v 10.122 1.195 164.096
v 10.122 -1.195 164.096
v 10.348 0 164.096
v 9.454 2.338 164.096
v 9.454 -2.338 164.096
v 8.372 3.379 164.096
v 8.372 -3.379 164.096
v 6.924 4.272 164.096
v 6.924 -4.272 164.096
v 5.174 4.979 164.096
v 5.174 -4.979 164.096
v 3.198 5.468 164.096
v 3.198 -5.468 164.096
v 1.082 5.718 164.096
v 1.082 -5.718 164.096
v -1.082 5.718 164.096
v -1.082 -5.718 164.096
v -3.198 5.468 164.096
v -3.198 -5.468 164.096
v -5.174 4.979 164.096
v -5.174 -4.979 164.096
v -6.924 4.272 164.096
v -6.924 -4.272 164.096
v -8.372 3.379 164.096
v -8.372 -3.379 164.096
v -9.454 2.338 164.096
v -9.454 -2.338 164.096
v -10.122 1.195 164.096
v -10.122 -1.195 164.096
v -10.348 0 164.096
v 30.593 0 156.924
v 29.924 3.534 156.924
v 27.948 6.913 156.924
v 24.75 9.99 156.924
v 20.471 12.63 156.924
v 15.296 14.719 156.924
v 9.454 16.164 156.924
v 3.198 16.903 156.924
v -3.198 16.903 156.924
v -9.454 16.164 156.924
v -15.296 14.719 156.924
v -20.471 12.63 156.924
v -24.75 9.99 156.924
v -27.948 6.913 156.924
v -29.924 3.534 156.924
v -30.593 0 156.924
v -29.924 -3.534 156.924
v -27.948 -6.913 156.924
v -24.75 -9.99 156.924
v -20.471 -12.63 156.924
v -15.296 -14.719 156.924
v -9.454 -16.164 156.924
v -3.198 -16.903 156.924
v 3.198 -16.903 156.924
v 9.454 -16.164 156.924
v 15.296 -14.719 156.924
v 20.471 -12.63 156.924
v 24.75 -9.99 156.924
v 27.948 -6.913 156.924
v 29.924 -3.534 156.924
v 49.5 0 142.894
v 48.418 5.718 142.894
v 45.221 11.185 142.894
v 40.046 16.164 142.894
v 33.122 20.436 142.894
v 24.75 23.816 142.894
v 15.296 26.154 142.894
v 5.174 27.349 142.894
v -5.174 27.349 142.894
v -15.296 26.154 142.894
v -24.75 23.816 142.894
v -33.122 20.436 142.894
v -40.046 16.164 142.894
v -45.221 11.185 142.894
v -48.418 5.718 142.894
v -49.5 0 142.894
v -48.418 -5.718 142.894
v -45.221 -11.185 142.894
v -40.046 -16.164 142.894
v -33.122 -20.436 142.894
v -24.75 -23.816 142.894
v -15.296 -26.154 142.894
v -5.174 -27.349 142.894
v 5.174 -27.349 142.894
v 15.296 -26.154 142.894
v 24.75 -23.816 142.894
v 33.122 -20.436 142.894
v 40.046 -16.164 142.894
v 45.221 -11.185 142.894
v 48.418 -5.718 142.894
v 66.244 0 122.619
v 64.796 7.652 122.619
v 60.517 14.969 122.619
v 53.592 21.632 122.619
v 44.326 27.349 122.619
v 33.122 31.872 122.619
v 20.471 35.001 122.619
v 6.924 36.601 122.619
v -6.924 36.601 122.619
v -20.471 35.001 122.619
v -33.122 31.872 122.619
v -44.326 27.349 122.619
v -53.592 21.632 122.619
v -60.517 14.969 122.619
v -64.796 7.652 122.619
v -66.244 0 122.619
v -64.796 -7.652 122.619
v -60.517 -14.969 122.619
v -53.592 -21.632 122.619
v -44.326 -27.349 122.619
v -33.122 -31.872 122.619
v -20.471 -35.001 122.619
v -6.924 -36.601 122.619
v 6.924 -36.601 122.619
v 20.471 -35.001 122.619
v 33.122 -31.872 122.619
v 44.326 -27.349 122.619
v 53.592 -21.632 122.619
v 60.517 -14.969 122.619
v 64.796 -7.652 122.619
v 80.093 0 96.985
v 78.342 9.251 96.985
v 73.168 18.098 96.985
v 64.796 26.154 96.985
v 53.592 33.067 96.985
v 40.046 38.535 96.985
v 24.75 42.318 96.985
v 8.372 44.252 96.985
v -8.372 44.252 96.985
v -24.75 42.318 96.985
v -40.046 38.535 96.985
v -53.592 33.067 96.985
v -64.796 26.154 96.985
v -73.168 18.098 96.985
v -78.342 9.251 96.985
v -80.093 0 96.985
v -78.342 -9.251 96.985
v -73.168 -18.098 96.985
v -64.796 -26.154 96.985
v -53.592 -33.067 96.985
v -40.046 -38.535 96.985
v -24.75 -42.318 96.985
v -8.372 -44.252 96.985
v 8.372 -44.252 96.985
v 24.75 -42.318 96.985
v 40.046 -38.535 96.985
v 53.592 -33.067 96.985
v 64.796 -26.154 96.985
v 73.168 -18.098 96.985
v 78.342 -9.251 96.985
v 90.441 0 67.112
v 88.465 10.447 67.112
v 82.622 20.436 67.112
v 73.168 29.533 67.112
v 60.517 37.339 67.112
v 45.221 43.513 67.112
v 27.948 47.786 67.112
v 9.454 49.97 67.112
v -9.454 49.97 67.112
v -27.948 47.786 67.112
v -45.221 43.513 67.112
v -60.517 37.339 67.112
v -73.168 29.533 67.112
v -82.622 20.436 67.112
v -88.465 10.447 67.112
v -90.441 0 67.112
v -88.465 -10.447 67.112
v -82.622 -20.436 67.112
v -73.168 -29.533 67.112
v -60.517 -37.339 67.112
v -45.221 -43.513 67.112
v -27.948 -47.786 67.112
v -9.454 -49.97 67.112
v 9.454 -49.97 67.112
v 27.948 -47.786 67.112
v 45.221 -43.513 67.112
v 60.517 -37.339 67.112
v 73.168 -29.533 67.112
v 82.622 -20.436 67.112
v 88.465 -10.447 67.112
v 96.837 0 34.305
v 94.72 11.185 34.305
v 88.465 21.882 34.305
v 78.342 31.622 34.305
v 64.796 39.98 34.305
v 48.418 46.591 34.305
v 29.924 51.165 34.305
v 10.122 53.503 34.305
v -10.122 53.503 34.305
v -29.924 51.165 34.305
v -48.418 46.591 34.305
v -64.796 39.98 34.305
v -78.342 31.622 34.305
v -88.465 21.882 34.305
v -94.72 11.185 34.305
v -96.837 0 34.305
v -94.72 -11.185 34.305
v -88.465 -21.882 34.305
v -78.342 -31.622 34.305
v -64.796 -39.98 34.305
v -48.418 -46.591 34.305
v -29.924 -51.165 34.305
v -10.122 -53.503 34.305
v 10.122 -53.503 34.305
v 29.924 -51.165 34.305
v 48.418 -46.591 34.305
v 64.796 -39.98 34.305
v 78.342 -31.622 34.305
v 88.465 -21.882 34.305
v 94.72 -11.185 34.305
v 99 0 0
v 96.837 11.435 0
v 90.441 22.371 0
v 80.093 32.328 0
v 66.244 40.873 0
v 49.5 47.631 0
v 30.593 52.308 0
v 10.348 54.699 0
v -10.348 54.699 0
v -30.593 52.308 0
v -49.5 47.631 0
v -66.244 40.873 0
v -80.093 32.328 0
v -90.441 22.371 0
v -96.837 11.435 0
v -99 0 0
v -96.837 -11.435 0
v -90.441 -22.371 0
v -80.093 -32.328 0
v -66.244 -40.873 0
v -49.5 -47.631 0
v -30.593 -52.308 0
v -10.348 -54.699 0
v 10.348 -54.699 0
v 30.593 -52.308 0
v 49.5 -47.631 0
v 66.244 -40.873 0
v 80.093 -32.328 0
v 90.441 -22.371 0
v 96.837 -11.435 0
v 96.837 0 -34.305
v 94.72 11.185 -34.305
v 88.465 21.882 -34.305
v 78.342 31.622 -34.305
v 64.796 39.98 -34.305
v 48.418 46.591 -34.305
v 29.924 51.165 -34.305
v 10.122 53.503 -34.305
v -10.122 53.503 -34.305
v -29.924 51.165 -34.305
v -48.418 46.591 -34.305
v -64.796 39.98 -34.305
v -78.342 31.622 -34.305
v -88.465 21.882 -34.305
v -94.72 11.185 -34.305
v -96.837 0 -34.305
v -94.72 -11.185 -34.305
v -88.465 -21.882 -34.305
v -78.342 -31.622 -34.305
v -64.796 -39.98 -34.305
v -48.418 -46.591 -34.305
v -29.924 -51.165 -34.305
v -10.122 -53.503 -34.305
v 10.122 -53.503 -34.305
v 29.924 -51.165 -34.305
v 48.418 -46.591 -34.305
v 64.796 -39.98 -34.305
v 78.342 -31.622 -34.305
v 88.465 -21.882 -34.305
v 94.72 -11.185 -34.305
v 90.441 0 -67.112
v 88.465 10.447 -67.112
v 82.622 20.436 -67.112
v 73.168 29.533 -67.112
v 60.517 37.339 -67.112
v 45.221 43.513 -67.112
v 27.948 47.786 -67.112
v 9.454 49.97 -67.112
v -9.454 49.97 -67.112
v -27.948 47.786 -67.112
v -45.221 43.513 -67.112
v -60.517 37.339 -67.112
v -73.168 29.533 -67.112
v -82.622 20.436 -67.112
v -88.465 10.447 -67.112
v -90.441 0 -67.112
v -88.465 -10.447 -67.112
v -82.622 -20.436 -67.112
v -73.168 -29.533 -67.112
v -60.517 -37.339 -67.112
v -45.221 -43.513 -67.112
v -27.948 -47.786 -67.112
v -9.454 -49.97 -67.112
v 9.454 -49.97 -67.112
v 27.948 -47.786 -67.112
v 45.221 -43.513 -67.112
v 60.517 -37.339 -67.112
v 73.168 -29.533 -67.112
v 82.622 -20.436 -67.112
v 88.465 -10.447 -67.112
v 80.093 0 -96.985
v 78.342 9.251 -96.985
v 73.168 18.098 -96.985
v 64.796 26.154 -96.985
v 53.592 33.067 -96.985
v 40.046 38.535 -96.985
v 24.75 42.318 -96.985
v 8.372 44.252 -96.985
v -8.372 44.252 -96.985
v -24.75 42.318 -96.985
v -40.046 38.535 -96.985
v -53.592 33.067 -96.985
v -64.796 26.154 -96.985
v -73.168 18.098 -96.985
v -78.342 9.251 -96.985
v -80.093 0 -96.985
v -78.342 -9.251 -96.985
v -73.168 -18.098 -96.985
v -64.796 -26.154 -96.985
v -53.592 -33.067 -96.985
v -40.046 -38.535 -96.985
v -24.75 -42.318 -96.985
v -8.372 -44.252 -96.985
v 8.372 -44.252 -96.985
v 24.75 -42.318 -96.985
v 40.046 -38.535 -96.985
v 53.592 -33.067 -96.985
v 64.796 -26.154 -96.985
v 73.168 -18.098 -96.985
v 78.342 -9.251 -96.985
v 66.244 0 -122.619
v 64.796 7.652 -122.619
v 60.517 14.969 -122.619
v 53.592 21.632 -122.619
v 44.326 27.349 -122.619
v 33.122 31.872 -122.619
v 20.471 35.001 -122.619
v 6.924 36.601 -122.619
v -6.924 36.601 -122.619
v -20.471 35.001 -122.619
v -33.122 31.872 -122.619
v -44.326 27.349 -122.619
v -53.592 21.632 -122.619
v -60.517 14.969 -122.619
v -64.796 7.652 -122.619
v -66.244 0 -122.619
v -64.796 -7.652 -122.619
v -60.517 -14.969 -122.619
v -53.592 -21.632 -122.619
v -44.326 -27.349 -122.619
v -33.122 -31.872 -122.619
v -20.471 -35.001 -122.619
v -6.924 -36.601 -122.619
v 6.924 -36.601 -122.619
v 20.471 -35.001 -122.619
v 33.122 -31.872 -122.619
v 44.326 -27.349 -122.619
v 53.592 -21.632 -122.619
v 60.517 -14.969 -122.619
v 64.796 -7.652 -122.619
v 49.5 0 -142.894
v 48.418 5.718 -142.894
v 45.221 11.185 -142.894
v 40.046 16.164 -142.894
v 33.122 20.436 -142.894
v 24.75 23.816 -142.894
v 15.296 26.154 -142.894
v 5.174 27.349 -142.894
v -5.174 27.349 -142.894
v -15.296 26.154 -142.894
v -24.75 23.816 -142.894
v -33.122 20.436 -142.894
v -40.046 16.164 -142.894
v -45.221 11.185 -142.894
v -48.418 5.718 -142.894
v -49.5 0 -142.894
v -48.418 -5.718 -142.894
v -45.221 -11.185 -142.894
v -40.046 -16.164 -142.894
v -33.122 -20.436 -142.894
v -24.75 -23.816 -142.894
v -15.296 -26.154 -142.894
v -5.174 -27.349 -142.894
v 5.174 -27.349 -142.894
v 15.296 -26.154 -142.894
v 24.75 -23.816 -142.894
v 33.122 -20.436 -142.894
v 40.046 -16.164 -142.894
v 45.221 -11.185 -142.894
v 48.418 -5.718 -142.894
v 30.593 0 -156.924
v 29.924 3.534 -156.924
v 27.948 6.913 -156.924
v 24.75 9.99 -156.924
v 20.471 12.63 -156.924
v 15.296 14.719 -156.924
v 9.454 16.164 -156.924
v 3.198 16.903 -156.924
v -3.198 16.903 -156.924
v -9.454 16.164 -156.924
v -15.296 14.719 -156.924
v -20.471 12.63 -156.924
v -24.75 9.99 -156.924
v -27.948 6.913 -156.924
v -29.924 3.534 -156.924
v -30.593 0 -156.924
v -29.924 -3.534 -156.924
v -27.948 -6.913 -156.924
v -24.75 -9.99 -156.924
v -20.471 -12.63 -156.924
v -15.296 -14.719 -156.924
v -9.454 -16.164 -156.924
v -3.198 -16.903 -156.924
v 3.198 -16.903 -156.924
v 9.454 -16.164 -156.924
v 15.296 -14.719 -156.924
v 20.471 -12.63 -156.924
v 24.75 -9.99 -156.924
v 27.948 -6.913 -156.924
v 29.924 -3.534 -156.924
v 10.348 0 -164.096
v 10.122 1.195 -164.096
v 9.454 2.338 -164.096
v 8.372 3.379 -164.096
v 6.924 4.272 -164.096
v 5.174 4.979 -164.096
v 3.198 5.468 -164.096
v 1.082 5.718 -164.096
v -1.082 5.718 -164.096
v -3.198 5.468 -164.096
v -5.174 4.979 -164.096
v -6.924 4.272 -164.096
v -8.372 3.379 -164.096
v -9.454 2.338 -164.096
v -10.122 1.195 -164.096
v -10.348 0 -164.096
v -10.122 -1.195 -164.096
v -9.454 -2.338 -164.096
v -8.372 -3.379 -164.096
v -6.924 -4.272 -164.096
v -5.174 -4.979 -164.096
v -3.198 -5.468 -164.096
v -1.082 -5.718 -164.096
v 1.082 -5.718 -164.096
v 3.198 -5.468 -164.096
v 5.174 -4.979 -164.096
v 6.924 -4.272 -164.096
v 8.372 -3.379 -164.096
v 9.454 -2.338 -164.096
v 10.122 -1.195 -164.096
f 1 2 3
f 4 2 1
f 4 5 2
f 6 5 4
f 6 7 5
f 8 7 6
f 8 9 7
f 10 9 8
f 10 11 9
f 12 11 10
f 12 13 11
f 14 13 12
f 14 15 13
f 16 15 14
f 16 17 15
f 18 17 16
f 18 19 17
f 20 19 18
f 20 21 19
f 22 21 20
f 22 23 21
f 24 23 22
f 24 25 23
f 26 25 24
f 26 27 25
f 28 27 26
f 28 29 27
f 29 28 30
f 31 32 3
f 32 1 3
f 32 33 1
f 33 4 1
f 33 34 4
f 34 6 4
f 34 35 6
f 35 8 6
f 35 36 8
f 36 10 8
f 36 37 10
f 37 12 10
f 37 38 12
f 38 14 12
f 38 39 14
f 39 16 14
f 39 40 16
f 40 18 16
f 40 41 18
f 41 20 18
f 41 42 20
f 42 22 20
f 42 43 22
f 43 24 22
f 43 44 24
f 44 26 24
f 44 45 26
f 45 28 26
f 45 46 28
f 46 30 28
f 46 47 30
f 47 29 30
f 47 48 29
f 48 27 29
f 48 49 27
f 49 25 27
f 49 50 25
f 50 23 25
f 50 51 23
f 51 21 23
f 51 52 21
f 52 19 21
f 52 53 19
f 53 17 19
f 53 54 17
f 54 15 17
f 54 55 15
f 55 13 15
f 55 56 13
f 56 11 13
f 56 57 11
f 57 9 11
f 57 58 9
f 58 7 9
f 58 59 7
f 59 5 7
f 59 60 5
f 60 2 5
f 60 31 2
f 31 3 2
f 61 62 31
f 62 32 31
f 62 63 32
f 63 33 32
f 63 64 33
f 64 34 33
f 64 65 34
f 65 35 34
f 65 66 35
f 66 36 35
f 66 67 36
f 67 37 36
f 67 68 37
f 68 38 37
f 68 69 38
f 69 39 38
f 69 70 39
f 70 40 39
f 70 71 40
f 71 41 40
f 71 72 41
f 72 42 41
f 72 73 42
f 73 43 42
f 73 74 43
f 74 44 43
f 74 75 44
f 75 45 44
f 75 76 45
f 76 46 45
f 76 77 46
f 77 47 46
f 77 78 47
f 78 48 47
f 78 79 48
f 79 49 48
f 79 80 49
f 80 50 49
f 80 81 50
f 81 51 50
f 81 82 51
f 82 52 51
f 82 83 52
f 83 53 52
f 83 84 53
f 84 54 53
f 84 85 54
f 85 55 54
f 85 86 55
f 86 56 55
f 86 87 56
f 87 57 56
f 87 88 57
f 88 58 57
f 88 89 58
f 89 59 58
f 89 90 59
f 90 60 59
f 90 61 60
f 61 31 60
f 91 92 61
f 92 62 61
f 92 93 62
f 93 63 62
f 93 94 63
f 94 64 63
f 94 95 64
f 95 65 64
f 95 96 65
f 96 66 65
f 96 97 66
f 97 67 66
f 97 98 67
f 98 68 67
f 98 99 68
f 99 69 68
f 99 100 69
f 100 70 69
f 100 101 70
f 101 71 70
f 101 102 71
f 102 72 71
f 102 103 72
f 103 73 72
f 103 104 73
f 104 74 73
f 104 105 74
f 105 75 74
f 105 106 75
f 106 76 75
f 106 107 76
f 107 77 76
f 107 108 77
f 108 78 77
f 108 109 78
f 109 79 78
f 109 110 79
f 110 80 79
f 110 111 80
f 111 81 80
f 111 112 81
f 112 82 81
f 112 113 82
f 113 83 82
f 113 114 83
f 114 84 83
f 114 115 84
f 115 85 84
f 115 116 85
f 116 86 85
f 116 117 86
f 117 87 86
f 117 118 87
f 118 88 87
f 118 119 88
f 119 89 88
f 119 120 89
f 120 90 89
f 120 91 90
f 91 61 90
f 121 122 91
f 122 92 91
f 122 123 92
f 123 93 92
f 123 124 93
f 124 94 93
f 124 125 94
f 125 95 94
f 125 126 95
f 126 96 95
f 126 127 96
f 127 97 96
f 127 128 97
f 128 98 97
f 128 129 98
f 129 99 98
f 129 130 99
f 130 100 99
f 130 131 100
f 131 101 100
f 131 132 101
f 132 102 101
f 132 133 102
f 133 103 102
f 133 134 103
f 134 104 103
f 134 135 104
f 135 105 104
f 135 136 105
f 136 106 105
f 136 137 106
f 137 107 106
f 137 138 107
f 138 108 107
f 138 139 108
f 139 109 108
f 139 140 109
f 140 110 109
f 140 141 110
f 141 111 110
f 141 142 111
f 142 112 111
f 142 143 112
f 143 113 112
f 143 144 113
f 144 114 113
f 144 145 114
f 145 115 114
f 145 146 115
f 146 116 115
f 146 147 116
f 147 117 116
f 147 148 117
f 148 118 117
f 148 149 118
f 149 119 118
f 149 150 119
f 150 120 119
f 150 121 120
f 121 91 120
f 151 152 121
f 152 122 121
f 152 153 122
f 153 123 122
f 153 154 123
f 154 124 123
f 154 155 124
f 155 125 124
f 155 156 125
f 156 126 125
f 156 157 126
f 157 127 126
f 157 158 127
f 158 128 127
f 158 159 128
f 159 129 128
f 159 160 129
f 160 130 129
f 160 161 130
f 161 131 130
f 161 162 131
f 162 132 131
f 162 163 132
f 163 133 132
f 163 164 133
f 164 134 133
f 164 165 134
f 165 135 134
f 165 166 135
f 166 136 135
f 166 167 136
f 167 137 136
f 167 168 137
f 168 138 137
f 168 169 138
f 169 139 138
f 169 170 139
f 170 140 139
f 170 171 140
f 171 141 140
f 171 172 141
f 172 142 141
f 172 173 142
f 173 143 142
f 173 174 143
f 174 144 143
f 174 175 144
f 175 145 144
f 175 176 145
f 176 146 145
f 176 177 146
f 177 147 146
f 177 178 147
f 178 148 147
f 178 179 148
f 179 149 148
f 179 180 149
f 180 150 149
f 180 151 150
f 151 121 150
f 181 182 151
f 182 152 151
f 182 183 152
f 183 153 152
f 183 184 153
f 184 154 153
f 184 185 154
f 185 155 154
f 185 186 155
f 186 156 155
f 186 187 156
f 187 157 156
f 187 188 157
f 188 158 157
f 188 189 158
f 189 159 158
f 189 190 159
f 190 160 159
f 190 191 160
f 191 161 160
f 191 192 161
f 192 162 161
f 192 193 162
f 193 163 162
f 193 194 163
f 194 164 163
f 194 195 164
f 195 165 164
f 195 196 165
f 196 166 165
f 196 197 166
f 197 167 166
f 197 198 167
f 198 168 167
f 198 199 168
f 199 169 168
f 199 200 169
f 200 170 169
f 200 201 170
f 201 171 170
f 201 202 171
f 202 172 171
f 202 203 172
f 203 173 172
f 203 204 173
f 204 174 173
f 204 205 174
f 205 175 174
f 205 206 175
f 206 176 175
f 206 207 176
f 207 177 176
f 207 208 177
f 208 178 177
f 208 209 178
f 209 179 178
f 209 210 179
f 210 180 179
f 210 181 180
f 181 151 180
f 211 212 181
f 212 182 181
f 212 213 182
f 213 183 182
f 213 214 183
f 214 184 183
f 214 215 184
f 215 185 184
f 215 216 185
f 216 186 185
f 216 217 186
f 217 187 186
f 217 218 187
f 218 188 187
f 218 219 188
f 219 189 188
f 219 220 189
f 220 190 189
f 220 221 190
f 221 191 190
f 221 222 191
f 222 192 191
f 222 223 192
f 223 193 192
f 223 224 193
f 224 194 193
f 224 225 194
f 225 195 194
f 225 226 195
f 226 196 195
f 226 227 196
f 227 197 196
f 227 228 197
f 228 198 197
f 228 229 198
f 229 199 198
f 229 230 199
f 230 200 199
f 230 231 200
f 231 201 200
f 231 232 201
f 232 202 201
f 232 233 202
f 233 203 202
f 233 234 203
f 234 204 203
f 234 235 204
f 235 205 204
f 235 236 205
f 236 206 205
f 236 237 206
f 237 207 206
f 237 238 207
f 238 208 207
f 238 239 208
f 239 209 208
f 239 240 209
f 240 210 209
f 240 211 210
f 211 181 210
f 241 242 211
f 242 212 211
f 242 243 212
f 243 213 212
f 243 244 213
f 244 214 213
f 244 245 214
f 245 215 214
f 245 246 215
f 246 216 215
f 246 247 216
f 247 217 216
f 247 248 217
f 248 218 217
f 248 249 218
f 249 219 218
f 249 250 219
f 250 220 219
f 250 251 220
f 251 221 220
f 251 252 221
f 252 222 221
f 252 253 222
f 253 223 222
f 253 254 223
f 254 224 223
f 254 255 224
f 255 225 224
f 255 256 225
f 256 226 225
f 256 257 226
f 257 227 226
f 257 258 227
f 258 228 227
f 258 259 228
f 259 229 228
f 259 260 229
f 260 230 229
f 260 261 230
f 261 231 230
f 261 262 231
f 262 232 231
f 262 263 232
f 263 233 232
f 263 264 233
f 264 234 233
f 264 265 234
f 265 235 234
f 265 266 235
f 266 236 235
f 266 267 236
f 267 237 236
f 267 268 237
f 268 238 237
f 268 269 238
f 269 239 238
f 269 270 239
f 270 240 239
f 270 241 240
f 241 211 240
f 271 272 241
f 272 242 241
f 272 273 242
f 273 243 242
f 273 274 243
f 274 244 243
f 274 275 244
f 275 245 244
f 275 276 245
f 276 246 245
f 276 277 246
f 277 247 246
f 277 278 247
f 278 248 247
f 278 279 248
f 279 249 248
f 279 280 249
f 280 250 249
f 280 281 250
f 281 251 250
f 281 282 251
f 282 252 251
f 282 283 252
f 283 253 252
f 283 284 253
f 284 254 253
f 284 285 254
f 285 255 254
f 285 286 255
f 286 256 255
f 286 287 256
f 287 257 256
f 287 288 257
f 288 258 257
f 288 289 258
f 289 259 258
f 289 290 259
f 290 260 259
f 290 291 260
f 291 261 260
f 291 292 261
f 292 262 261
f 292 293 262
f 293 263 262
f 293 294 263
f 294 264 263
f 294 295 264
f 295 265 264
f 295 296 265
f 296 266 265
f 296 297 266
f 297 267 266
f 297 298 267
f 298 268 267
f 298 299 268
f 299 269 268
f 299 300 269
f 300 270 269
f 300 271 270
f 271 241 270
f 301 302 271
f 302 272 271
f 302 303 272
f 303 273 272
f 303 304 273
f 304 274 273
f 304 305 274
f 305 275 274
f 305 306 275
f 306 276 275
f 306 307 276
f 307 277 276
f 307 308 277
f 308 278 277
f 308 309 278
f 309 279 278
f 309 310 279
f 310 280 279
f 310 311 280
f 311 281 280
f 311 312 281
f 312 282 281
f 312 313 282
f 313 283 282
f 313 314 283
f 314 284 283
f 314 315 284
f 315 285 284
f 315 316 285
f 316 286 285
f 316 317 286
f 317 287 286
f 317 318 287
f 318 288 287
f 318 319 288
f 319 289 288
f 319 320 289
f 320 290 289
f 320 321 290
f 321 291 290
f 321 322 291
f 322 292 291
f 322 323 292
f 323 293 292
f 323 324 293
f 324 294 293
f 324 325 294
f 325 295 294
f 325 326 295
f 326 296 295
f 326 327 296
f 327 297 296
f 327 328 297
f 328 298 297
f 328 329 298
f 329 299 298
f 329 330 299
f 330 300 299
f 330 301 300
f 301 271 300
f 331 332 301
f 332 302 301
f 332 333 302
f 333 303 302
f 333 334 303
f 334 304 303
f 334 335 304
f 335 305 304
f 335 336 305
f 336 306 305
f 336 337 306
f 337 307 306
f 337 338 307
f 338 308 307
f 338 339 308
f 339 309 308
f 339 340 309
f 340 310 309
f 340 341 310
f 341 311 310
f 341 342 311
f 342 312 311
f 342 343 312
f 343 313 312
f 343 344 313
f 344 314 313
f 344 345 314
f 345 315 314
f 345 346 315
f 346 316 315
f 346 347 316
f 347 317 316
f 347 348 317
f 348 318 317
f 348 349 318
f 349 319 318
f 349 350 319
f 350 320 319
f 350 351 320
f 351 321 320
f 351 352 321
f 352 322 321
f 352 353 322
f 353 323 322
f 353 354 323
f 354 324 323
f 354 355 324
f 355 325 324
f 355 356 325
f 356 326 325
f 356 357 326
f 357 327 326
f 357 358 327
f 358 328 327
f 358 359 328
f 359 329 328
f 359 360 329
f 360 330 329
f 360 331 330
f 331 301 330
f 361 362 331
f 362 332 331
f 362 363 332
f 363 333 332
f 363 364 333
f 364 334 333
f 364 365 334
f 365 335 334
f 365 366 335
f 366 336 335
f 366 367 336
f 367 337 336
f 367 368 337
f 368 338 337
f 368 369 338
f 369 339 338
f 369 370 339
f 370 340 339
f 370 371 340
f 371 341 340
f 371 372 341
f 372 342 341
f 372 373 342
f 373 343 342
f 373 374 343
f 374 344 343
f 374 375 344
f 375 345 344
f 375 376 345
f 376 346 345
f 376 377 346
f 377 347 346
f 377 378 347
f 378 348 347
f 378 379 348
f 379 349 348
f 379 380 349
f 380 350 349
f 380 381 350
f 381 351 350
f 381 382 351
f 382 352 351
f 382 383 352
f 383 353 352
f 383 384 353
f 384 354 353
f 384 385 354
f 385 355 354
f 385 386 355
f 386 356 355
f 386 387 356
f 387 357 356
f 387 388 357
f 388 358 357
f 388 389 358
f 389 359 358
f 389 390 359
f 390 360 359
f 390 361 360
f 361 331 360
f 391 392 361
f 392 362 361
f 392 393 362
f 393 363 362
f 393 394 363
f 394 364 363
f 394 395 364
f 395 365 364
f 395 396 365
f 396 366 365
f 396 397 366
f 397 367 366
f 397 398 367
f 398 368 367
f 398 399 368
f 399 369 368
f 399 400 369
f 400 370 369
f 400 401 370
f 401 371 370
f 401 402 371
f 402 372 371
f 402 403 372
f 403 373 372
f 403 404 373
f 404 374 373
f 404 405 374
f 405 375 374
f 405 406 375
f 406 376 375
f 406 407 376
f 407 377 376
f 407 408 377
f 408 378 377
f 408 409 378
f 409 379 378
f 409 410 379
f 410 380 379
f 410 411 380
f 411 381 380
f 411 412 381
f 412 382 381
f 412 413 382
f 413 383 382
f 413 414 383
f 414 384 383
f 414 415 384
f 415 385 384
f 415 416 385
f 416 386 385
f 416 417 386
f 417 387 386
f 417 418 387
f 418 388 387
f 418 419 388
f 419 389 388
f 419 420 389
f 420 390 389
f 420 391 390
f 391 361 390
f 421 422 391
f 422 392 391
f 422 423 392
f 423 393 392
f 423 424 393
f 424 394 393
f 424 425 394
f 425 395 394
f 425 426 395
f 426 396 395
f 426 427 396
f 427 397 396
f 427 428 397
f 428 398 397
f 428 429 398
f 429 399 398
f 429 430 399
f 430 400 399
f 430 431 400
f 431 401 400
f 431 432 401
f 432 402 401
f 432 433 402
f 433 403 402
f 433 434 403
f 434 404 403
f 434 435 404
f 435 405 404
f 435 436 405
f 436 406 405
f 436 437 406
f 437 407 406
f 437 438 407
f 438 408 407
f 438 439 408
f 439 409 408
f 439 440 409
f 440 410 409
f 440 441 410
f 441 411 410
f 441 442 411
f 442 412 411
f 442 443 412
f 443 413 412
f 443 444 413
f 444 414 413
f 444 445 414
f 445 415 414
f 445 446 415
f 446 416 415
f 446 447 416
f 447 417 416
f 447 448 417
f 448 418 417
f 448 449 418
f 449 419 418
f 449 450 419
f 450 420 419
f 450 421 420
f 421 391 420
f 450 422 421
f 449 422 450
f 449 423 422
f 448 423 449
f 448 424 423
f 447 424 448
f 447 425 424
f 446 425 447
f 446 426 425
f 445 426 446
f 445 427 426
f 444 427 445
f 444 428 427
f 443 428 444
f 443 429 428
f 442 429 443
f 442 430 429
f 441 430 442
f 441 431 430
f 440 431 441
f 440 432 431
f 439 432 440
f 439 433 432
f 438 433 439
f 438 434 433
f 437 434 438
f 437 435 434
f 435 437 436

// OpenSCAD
// Generated by SolidPython 1.0.1 on 2020-07-29 00:46:48


scale(v = [9, 5, 15]) {
	sphere(r = 11);
}
/***********************************************
*********      SolidPython code:      **********
************************************************
 
# import packages: SolidPython
from solid import *
from solid.utils import *
from itertools import chain, combinations, permutations


class Resize:

    def __init__(self, scad_file):
        self.scad_file = scad_file
        #self.scad_file = import_scad(scad_file)
        # cone/cylinder param:
        self.r1 = 0
        self.r2 = 0
        self.h = 0
        # rectangular prism param:
        self.w = 0
        self.l = 0
        # ellipse param:
        self.r = 0

    # import OpenScad code (file name corresponds to shape)


    # classify shape + parameters
    def assign(self, param1, param2, param3):
        if self.scad_file == 'cone.scad':
            self.r1 = param1
            self.r2 = param2
            self.h = param3
        elif self.scad_file == 'cylinder.scad':
            self.r1 = param1
            self.r2 = param2
            self.h = param3
        elif self.scad_file == 'rectangularPrism.scad':
            self.h = param1
            self.l = param2
            self.w = param3
        else:
            self.r = param1
            self.h = param2

    # resize parameters
    def iterate(self):
        x = range(3, 20, 2)
        i = 1
        if self.scad_file == 'cone.scad':
            tempList = list(permutations(x, 2))
            for temp in tempList:
                param1 = temp[0]
                param2 = temp[1]
                filepath = 'produced_scad_files/' + 'cone' + str(param1) + '_' + str(param2) + '_' + '.scad'
                scad_render_to_file(cylinder(h=param1, r1=param2, r2=0), filepath)

        elif self.scad_file == 'cylinder.scad':
            tempList = list(permutations(x, 3))
            for temp in tempList:
                param1 = temp[0]
                param2 = temp[1]
                filepath = 'produced_scad_files/' + 'cylinder' + str(param1) + '_' + str(param2) + '_' + '.scad'
                scad_render_to_file(cylinder(h=param1, r1=param2, r2=param2), filepath)

        elif self.scad_file == 'rectangularPrism.scad':
            tempList = list(permutations(x, 3))
            for temp in tempList:
                param1 = temp[0]
                param2 = temp[1]
                param3 = temp[2]
                filepath = 'produced_scad_files/' + 'rectangularPrism' + str(param1) + '_' + str(param2) + '_' + str(
                    param3) + '.scad'
                scad_render_to_file(cube(size=(param1, param2, param3)), filepath)

        elif self.scad_file == 'ellipse.scad':
            tempList = list(permutations(x, 4))
            for temp in tempList:
                param1 = temp[0]
                param2 = temp[1]
                param3 = temp[2]
                param4 = temp[3]
                filepath = 'produced_scad_files/' + 'ellipse' + str(param1) + '_' + str(param2) + '_' + str(param3) + '_' + str(param4) + '.scad'
                scad_render_to_file(scale([param1, param2, param3])(sphere(r=param4)), filepath)

    def render_to_scadfile(self):
        scad_render_to_file(scad, 'example.scad') 
 
************************************************/
